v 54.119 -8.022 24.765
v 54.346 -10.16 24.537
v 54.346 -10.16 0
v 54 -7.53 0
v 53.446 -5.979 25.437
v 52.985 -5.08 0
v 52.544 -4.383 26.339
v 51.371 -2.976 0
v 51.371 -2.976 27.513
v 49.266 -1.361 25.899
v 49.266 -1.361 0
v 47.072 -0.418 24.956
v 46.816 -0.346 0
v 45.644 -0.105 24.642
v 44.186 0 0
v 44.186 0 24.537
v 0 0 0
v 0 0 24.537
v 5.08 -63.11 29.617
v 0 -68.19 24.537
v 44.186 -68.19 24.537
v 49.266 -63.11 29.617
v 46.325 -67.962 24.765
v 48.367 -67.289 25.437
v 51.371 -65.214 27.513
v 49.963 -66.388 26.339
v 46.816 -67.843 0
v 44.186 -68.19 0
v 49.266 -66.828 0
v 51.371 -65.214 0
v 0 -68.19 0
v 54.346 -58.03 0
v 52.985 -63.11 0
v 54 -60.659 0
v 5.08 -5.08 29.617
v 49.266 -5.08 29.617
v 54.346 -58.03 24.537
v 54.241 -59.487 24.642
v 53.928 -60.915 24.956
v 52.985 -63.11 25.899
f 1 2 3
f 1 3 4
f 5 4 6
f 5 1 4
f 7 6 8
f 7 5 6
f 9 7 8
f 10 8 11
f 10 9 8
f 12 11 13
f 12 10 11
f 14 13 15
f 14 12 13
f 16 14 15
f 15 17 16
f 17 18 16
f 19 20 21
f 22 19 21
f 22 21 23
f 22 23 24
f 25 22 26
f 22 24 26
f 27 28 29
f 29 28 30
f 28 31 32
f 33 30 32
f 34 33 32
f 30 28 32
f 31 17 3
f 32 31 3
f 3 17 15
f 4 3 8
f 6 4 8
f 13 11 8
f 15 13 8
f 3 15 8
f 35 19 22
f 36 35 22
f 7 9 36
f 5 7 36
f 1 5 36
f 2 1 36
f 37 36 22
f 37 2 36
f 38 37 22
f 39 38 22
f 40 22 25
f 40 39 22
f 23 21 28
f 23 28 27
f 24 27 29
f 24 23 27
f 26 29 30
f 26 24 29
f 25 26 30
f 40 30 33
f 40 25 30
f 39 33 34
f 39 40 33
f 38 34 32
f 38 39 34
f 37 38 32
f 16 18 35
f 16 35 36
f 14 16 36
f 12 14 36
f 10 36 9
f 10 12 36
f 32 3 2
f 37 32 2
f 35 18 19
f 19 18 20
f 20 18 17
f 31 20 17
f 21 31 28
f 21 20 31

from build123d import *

# Parameters (mm, degrees)
F0_W     = 39.1064089628
F0_H     = 16.67773308
F1_DEPTH = 68.1895
F2_SIZE2 = 5.08
F2_SIZE  = 5.08
F3_R     = 10.16


with BuildPart() as f1:
    # F0 (on Front) → F1 (new body)
    with BuildSketch(Plane.XZ):
        with Locations((34.7932044814, 21.27848872)):
            Rectangle(F0_W, F0_H)
        Polygon((0, 29.6173552599), (0, 0), (54.3464089628, 0), (54.3464089628, 12.93962218), (15.24, 12.93962218), (15.24, 29.6173552599), align=None)
    extrude(amount=F1_DEPTH)

    # F2
    f2_edges = [f1.edges().sort_by_distance(p)[0] for p in [
        (54.346409, -34.09475, 29.617355),
        (27.173204, 0, 29.617355),
        (0, -34.09475, 29.617355),
        (27.173204, -68.1895, 29.617355),
    ]]
    chamfer(f2_edges, length=F2_SIZE, length2=F2_SIZE2)

    # F3
    f3_edges = [f1.edges().sort_by_distance(p)[0] for p in [
        (54.346409, 0, 12.268678),
        (54.346409, -68.1895, 12.268678),
    ]]
    fillet(f3_edges, radius=F3_R)


solid = f1.part
